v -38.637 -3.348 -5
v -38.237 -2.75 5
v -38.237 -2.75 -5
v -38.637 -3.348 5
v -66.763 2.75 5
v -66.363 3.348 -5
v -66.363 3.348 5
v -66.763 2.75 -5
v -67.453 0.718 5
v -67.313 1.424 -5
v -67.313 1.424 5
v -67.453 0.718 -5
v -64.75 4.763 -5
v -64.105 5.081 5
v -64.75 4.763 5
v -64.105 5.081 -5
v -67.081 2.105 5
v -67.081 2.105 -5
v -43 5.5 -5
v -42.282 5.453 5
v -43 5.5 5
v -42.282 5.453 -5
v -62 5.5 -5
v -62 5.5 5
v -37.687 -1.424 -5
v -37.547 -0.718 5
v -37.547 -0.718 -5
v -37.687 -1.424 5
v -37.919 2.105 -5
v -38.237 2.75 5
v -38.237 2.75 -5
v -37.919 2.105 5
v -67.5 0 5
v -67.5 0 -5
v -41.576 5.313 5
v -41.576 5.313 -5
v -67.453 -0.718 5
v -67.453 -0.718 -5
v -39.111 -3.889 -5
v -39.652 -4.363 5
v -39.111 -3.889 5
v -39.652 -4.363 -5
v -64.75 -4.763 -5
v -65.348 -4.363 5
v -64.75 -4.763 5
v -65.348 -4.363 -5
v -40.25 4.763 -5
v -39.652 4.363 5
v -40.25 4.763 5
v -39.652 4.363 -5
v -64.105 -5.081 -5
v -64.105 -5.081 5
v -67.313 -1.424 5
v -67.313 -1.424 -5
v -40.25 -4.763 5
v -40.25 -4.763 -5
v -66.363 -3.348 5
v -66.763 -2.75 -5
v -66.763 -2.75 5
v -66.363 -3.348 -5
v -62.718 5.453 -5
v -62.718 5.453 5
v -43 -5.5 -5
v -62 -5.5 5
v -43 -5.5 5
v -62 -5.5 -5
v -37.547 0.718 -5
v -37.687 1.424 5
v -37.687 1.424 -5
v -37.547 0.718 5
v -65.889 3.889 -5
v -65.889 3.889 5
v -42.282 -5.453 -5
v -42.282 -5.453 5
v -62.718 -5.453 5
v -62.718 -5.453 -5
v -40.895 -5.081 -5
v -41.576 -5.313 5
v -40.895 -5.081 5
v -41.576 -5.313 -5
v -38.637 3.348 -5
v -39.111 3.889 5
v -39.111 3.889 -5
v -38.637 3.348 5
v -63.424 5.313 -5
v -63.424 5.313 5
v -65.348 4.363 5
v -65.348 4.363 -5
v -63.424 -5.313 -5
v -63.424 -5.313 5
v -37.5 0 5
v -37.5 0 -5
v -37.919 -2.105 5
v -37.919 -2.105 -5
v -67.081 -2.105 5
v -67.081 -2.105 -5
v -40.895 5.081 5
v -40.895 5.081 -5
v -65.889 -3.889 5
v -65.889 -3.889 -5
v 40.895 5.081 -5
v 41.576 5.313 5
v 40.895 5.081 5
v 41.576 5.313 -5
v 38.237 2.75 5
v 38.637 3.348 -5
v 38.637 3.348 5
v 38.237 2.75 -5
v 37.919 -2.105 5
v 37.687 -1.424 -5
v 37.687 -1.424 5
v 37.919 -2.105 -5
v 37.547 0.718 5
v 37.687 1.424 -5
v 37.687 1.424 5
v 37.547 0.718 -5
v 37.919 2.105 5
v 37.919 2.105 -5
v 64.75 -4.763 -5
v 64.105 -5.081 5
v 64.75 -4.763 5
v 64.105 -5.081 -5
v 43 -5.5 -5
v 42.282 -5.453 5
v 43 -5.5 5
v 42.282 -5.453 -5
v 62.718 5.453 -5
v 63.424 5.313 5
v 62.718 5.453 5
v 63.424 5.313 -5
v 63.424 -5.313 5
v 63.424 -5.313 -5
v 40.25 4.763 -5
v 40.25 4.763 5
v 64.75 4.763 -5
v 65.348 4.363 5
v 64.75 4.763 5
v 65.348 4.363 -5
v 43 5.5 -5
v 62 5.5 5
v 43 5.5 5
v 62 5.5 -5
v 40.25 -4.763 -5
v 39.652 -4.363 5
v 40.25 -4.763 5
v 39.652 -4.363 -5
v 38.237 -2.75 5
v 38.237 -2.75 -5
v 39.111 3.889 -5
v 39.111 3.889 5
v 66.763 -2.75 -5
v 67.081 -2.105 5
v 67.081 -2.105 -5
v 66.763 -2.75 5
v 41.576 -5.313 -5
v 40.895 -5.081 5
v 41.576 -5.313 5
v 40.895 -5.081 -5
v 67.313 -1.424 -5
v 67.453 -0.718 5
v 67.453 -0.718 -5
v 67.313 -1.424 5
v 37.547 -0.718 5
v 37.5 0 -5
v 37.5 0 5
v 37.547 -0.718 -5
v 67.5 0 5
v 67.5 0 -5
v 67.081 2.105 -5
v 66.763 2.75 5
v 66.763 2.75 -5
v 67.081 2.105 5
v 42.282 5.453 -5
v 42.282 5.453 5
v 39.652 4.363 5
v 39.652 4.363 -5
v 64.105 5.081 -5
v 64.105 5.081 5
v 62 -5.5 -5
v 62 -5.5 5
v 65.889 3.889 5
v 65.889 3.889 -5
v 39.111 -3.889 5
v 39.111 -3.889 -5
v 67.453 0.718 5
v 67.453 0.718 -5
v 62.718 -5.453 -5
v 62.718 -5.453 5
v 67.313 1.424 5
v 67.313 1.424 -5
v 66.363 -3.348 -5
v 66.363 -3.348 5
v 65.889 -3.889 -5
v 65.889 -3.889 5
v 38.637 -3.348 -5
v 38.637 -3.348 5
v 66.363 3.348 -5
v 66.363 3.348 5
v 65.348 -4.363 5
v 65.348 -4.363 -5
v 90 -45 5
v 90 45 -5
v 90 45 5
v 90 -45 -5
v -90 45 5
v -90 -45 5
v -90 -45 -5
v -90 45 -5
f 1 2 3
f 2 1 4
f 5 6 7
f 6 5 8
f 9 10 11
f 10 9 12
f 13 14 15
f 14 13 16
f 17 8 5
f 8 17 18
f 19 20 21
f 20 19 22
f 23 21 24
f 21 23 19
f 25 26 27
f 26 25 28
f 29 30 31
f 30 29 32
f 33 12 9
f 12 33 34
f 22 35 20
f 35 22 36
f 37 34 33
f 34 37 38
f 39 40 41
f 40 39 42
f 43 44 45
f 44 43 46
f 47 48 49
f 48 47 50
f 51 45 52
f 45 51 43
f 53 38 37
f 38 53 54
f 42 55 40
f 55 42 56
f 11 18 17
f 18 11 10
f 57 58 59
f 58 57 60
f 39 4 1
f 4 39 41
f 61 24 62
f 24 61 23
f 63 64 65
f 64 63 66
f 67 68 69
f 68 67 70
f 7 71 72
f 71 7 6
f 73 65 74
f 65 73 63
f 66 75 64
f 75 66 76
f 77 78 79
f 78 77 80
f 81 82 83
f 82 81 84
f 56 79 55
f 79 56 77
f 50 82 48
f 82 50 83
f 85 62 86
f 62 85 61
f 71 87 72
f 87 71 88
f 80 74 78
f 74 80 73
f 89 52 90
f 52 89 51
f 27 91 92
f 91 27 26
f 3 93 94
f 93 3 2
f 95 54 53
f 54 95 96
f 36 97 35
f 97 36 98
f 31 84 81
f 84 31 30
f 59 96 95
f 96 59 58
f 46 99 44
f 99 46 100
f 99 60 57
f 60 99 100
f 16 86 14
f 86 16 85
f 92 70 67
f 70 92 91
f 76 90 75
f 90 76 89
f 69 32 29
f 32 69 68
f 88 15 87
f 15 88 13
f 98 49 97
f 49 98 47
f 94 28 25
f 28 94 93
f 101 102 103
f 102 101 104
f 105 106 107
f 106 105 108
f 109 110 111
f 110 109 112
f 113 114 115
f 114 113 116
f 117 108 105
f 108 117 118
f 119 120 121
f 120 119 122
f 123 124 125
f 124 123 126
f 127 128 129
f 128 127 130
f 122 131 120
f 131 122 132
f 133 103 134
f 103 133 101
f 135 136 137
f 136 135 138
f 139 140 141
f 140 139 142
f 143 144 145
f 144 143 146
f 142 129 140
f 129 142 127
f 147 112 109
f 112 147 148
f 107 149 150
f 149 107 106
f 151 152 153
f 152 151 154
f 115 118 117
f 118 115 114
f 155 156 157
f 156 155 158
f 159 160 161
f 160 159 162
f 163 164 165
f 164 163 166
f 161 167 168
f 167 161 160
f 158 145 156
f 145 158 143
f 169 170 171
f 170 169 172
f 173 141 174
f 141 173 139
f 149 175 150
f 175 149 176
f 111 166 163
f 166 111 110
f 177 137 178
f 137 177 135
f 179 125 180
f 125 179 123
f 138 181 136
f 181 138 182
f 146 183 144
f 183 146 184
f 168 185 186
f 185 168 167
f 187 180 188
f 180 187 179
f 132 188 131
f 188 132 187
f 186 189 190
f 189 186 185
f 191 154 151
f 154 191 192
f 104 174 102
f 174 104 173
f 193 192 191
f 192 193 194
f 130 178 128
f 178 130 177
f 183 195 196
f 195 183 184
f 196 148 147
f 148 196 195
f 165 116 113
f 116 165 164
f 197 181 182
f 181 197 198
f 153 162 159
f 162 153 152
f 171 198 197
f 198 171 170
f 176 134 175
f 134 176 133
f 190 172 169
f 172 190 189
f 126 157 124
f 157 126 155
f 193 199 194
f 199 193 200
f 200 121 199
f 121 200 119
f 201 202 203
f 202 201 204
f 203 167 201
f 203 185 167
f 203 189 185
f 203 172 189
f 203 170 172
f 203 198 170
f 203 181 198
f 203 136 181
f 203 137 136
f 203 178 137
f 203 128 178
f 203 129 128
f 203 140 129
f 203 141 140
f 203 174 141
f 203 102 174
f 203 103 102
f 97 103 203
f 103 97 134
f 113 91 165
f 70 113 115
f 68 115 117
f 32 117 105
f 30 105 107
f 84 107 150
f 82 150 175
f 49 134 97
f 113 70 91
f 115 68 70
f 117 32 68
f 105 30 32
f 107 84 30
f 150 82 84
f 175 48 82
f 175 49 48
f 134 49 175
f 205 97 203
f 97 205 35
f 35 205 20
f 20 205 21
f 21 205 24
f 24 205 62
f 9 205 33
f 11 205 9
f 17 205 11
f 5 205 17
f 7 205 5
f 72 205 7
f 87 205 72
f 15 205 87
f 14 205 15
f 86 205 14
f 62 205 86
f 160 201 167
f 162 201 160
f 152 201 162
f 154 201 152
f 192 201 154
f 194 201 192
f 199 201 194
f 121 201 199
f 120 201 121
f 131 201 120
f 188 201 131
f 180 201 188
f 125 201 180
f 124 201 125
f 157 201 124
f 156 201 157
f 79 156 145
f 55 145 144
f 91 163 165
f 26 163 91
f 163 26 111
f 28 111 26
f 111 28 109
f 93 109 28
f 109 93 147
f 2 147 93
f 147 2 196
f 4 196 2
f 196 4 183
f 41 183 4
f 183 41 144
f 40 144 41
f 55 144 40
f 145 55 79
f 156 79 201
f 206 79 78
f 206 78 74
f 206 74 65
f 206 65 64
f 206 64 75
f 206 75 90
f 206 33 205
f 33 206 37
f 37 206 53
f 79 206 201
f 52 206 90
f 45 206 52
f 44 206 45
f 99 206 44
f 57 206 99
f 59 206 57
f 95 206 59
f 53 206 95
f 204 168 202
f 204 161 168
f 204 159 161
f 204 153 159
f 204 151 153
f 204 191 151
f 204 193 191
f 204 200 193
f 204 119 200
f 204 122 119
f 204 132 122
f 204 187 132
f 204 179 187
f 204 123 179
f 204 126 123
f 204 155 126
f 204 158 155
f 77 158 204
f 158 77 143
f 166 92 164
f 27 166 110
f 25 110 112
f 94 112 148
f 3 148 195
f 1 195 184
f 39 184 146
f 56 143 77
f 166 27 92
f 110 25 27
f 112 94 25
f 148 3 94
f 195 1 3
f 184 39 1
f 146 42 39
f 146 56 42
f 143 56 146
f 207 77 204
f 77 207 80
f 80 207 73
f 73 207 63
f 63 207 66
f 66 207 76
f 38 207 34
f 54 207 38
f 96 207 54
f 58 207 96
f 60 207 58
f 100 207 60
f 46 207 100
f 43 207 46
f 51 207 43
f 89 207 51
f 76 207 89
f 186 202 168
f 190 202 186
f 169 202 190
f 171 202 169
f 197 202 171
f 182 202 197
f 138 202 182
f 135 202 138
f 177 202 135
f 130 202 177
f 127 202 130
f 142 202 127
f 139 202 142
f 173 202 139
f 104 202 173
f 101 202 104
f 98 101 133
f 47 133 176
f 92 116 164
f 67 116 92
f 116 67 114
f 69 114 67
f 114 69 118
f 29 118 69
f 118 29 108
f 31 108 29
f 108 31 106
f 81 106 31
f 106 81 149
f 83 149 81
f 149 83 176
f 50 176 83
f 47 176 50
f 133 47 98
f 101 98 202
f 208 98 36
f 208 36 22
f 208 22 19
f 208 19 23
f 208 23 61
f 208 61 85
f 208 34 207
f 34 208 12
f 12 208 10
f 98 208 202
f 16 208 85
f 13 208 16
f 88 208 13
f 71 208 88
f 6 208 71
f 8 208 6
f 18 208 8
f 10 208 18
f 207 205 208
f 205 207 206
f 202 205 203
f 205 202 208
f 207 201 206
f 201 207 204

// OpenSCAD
// OpenSCAD bracket plate type B
// Units: millimeters

plate_length_mm = 180;
plate_width_mm = 90;
plate_thickness_mm = 10;
slot_length_mm = 30;
slot_width_mm = 11;
slot_spacing_mm = 105;

$fn = 48;

module slot(length, width, depth) {
    hull() {
        translate([-length / 2 + width / 2, 0, 0]) cylinder(h = depth, r = width / 2, center = true);
        translate([length / 2 - width / 2, 0, 0]) cylinder(h = depth, r = width / 2, center = true);
    }
}

difference() {
    cube([plate_length_mm, plate_width_mm, plate_thickness_mm], center = true);
    for (x = [-slot_spacing_mm / 2, slot_spacing_mm / 2]) {
        translate([x, 0, 0])
            slot(slot_length_mm, slot_width_mm, plate_thickness_mm + 2);
    }
}
